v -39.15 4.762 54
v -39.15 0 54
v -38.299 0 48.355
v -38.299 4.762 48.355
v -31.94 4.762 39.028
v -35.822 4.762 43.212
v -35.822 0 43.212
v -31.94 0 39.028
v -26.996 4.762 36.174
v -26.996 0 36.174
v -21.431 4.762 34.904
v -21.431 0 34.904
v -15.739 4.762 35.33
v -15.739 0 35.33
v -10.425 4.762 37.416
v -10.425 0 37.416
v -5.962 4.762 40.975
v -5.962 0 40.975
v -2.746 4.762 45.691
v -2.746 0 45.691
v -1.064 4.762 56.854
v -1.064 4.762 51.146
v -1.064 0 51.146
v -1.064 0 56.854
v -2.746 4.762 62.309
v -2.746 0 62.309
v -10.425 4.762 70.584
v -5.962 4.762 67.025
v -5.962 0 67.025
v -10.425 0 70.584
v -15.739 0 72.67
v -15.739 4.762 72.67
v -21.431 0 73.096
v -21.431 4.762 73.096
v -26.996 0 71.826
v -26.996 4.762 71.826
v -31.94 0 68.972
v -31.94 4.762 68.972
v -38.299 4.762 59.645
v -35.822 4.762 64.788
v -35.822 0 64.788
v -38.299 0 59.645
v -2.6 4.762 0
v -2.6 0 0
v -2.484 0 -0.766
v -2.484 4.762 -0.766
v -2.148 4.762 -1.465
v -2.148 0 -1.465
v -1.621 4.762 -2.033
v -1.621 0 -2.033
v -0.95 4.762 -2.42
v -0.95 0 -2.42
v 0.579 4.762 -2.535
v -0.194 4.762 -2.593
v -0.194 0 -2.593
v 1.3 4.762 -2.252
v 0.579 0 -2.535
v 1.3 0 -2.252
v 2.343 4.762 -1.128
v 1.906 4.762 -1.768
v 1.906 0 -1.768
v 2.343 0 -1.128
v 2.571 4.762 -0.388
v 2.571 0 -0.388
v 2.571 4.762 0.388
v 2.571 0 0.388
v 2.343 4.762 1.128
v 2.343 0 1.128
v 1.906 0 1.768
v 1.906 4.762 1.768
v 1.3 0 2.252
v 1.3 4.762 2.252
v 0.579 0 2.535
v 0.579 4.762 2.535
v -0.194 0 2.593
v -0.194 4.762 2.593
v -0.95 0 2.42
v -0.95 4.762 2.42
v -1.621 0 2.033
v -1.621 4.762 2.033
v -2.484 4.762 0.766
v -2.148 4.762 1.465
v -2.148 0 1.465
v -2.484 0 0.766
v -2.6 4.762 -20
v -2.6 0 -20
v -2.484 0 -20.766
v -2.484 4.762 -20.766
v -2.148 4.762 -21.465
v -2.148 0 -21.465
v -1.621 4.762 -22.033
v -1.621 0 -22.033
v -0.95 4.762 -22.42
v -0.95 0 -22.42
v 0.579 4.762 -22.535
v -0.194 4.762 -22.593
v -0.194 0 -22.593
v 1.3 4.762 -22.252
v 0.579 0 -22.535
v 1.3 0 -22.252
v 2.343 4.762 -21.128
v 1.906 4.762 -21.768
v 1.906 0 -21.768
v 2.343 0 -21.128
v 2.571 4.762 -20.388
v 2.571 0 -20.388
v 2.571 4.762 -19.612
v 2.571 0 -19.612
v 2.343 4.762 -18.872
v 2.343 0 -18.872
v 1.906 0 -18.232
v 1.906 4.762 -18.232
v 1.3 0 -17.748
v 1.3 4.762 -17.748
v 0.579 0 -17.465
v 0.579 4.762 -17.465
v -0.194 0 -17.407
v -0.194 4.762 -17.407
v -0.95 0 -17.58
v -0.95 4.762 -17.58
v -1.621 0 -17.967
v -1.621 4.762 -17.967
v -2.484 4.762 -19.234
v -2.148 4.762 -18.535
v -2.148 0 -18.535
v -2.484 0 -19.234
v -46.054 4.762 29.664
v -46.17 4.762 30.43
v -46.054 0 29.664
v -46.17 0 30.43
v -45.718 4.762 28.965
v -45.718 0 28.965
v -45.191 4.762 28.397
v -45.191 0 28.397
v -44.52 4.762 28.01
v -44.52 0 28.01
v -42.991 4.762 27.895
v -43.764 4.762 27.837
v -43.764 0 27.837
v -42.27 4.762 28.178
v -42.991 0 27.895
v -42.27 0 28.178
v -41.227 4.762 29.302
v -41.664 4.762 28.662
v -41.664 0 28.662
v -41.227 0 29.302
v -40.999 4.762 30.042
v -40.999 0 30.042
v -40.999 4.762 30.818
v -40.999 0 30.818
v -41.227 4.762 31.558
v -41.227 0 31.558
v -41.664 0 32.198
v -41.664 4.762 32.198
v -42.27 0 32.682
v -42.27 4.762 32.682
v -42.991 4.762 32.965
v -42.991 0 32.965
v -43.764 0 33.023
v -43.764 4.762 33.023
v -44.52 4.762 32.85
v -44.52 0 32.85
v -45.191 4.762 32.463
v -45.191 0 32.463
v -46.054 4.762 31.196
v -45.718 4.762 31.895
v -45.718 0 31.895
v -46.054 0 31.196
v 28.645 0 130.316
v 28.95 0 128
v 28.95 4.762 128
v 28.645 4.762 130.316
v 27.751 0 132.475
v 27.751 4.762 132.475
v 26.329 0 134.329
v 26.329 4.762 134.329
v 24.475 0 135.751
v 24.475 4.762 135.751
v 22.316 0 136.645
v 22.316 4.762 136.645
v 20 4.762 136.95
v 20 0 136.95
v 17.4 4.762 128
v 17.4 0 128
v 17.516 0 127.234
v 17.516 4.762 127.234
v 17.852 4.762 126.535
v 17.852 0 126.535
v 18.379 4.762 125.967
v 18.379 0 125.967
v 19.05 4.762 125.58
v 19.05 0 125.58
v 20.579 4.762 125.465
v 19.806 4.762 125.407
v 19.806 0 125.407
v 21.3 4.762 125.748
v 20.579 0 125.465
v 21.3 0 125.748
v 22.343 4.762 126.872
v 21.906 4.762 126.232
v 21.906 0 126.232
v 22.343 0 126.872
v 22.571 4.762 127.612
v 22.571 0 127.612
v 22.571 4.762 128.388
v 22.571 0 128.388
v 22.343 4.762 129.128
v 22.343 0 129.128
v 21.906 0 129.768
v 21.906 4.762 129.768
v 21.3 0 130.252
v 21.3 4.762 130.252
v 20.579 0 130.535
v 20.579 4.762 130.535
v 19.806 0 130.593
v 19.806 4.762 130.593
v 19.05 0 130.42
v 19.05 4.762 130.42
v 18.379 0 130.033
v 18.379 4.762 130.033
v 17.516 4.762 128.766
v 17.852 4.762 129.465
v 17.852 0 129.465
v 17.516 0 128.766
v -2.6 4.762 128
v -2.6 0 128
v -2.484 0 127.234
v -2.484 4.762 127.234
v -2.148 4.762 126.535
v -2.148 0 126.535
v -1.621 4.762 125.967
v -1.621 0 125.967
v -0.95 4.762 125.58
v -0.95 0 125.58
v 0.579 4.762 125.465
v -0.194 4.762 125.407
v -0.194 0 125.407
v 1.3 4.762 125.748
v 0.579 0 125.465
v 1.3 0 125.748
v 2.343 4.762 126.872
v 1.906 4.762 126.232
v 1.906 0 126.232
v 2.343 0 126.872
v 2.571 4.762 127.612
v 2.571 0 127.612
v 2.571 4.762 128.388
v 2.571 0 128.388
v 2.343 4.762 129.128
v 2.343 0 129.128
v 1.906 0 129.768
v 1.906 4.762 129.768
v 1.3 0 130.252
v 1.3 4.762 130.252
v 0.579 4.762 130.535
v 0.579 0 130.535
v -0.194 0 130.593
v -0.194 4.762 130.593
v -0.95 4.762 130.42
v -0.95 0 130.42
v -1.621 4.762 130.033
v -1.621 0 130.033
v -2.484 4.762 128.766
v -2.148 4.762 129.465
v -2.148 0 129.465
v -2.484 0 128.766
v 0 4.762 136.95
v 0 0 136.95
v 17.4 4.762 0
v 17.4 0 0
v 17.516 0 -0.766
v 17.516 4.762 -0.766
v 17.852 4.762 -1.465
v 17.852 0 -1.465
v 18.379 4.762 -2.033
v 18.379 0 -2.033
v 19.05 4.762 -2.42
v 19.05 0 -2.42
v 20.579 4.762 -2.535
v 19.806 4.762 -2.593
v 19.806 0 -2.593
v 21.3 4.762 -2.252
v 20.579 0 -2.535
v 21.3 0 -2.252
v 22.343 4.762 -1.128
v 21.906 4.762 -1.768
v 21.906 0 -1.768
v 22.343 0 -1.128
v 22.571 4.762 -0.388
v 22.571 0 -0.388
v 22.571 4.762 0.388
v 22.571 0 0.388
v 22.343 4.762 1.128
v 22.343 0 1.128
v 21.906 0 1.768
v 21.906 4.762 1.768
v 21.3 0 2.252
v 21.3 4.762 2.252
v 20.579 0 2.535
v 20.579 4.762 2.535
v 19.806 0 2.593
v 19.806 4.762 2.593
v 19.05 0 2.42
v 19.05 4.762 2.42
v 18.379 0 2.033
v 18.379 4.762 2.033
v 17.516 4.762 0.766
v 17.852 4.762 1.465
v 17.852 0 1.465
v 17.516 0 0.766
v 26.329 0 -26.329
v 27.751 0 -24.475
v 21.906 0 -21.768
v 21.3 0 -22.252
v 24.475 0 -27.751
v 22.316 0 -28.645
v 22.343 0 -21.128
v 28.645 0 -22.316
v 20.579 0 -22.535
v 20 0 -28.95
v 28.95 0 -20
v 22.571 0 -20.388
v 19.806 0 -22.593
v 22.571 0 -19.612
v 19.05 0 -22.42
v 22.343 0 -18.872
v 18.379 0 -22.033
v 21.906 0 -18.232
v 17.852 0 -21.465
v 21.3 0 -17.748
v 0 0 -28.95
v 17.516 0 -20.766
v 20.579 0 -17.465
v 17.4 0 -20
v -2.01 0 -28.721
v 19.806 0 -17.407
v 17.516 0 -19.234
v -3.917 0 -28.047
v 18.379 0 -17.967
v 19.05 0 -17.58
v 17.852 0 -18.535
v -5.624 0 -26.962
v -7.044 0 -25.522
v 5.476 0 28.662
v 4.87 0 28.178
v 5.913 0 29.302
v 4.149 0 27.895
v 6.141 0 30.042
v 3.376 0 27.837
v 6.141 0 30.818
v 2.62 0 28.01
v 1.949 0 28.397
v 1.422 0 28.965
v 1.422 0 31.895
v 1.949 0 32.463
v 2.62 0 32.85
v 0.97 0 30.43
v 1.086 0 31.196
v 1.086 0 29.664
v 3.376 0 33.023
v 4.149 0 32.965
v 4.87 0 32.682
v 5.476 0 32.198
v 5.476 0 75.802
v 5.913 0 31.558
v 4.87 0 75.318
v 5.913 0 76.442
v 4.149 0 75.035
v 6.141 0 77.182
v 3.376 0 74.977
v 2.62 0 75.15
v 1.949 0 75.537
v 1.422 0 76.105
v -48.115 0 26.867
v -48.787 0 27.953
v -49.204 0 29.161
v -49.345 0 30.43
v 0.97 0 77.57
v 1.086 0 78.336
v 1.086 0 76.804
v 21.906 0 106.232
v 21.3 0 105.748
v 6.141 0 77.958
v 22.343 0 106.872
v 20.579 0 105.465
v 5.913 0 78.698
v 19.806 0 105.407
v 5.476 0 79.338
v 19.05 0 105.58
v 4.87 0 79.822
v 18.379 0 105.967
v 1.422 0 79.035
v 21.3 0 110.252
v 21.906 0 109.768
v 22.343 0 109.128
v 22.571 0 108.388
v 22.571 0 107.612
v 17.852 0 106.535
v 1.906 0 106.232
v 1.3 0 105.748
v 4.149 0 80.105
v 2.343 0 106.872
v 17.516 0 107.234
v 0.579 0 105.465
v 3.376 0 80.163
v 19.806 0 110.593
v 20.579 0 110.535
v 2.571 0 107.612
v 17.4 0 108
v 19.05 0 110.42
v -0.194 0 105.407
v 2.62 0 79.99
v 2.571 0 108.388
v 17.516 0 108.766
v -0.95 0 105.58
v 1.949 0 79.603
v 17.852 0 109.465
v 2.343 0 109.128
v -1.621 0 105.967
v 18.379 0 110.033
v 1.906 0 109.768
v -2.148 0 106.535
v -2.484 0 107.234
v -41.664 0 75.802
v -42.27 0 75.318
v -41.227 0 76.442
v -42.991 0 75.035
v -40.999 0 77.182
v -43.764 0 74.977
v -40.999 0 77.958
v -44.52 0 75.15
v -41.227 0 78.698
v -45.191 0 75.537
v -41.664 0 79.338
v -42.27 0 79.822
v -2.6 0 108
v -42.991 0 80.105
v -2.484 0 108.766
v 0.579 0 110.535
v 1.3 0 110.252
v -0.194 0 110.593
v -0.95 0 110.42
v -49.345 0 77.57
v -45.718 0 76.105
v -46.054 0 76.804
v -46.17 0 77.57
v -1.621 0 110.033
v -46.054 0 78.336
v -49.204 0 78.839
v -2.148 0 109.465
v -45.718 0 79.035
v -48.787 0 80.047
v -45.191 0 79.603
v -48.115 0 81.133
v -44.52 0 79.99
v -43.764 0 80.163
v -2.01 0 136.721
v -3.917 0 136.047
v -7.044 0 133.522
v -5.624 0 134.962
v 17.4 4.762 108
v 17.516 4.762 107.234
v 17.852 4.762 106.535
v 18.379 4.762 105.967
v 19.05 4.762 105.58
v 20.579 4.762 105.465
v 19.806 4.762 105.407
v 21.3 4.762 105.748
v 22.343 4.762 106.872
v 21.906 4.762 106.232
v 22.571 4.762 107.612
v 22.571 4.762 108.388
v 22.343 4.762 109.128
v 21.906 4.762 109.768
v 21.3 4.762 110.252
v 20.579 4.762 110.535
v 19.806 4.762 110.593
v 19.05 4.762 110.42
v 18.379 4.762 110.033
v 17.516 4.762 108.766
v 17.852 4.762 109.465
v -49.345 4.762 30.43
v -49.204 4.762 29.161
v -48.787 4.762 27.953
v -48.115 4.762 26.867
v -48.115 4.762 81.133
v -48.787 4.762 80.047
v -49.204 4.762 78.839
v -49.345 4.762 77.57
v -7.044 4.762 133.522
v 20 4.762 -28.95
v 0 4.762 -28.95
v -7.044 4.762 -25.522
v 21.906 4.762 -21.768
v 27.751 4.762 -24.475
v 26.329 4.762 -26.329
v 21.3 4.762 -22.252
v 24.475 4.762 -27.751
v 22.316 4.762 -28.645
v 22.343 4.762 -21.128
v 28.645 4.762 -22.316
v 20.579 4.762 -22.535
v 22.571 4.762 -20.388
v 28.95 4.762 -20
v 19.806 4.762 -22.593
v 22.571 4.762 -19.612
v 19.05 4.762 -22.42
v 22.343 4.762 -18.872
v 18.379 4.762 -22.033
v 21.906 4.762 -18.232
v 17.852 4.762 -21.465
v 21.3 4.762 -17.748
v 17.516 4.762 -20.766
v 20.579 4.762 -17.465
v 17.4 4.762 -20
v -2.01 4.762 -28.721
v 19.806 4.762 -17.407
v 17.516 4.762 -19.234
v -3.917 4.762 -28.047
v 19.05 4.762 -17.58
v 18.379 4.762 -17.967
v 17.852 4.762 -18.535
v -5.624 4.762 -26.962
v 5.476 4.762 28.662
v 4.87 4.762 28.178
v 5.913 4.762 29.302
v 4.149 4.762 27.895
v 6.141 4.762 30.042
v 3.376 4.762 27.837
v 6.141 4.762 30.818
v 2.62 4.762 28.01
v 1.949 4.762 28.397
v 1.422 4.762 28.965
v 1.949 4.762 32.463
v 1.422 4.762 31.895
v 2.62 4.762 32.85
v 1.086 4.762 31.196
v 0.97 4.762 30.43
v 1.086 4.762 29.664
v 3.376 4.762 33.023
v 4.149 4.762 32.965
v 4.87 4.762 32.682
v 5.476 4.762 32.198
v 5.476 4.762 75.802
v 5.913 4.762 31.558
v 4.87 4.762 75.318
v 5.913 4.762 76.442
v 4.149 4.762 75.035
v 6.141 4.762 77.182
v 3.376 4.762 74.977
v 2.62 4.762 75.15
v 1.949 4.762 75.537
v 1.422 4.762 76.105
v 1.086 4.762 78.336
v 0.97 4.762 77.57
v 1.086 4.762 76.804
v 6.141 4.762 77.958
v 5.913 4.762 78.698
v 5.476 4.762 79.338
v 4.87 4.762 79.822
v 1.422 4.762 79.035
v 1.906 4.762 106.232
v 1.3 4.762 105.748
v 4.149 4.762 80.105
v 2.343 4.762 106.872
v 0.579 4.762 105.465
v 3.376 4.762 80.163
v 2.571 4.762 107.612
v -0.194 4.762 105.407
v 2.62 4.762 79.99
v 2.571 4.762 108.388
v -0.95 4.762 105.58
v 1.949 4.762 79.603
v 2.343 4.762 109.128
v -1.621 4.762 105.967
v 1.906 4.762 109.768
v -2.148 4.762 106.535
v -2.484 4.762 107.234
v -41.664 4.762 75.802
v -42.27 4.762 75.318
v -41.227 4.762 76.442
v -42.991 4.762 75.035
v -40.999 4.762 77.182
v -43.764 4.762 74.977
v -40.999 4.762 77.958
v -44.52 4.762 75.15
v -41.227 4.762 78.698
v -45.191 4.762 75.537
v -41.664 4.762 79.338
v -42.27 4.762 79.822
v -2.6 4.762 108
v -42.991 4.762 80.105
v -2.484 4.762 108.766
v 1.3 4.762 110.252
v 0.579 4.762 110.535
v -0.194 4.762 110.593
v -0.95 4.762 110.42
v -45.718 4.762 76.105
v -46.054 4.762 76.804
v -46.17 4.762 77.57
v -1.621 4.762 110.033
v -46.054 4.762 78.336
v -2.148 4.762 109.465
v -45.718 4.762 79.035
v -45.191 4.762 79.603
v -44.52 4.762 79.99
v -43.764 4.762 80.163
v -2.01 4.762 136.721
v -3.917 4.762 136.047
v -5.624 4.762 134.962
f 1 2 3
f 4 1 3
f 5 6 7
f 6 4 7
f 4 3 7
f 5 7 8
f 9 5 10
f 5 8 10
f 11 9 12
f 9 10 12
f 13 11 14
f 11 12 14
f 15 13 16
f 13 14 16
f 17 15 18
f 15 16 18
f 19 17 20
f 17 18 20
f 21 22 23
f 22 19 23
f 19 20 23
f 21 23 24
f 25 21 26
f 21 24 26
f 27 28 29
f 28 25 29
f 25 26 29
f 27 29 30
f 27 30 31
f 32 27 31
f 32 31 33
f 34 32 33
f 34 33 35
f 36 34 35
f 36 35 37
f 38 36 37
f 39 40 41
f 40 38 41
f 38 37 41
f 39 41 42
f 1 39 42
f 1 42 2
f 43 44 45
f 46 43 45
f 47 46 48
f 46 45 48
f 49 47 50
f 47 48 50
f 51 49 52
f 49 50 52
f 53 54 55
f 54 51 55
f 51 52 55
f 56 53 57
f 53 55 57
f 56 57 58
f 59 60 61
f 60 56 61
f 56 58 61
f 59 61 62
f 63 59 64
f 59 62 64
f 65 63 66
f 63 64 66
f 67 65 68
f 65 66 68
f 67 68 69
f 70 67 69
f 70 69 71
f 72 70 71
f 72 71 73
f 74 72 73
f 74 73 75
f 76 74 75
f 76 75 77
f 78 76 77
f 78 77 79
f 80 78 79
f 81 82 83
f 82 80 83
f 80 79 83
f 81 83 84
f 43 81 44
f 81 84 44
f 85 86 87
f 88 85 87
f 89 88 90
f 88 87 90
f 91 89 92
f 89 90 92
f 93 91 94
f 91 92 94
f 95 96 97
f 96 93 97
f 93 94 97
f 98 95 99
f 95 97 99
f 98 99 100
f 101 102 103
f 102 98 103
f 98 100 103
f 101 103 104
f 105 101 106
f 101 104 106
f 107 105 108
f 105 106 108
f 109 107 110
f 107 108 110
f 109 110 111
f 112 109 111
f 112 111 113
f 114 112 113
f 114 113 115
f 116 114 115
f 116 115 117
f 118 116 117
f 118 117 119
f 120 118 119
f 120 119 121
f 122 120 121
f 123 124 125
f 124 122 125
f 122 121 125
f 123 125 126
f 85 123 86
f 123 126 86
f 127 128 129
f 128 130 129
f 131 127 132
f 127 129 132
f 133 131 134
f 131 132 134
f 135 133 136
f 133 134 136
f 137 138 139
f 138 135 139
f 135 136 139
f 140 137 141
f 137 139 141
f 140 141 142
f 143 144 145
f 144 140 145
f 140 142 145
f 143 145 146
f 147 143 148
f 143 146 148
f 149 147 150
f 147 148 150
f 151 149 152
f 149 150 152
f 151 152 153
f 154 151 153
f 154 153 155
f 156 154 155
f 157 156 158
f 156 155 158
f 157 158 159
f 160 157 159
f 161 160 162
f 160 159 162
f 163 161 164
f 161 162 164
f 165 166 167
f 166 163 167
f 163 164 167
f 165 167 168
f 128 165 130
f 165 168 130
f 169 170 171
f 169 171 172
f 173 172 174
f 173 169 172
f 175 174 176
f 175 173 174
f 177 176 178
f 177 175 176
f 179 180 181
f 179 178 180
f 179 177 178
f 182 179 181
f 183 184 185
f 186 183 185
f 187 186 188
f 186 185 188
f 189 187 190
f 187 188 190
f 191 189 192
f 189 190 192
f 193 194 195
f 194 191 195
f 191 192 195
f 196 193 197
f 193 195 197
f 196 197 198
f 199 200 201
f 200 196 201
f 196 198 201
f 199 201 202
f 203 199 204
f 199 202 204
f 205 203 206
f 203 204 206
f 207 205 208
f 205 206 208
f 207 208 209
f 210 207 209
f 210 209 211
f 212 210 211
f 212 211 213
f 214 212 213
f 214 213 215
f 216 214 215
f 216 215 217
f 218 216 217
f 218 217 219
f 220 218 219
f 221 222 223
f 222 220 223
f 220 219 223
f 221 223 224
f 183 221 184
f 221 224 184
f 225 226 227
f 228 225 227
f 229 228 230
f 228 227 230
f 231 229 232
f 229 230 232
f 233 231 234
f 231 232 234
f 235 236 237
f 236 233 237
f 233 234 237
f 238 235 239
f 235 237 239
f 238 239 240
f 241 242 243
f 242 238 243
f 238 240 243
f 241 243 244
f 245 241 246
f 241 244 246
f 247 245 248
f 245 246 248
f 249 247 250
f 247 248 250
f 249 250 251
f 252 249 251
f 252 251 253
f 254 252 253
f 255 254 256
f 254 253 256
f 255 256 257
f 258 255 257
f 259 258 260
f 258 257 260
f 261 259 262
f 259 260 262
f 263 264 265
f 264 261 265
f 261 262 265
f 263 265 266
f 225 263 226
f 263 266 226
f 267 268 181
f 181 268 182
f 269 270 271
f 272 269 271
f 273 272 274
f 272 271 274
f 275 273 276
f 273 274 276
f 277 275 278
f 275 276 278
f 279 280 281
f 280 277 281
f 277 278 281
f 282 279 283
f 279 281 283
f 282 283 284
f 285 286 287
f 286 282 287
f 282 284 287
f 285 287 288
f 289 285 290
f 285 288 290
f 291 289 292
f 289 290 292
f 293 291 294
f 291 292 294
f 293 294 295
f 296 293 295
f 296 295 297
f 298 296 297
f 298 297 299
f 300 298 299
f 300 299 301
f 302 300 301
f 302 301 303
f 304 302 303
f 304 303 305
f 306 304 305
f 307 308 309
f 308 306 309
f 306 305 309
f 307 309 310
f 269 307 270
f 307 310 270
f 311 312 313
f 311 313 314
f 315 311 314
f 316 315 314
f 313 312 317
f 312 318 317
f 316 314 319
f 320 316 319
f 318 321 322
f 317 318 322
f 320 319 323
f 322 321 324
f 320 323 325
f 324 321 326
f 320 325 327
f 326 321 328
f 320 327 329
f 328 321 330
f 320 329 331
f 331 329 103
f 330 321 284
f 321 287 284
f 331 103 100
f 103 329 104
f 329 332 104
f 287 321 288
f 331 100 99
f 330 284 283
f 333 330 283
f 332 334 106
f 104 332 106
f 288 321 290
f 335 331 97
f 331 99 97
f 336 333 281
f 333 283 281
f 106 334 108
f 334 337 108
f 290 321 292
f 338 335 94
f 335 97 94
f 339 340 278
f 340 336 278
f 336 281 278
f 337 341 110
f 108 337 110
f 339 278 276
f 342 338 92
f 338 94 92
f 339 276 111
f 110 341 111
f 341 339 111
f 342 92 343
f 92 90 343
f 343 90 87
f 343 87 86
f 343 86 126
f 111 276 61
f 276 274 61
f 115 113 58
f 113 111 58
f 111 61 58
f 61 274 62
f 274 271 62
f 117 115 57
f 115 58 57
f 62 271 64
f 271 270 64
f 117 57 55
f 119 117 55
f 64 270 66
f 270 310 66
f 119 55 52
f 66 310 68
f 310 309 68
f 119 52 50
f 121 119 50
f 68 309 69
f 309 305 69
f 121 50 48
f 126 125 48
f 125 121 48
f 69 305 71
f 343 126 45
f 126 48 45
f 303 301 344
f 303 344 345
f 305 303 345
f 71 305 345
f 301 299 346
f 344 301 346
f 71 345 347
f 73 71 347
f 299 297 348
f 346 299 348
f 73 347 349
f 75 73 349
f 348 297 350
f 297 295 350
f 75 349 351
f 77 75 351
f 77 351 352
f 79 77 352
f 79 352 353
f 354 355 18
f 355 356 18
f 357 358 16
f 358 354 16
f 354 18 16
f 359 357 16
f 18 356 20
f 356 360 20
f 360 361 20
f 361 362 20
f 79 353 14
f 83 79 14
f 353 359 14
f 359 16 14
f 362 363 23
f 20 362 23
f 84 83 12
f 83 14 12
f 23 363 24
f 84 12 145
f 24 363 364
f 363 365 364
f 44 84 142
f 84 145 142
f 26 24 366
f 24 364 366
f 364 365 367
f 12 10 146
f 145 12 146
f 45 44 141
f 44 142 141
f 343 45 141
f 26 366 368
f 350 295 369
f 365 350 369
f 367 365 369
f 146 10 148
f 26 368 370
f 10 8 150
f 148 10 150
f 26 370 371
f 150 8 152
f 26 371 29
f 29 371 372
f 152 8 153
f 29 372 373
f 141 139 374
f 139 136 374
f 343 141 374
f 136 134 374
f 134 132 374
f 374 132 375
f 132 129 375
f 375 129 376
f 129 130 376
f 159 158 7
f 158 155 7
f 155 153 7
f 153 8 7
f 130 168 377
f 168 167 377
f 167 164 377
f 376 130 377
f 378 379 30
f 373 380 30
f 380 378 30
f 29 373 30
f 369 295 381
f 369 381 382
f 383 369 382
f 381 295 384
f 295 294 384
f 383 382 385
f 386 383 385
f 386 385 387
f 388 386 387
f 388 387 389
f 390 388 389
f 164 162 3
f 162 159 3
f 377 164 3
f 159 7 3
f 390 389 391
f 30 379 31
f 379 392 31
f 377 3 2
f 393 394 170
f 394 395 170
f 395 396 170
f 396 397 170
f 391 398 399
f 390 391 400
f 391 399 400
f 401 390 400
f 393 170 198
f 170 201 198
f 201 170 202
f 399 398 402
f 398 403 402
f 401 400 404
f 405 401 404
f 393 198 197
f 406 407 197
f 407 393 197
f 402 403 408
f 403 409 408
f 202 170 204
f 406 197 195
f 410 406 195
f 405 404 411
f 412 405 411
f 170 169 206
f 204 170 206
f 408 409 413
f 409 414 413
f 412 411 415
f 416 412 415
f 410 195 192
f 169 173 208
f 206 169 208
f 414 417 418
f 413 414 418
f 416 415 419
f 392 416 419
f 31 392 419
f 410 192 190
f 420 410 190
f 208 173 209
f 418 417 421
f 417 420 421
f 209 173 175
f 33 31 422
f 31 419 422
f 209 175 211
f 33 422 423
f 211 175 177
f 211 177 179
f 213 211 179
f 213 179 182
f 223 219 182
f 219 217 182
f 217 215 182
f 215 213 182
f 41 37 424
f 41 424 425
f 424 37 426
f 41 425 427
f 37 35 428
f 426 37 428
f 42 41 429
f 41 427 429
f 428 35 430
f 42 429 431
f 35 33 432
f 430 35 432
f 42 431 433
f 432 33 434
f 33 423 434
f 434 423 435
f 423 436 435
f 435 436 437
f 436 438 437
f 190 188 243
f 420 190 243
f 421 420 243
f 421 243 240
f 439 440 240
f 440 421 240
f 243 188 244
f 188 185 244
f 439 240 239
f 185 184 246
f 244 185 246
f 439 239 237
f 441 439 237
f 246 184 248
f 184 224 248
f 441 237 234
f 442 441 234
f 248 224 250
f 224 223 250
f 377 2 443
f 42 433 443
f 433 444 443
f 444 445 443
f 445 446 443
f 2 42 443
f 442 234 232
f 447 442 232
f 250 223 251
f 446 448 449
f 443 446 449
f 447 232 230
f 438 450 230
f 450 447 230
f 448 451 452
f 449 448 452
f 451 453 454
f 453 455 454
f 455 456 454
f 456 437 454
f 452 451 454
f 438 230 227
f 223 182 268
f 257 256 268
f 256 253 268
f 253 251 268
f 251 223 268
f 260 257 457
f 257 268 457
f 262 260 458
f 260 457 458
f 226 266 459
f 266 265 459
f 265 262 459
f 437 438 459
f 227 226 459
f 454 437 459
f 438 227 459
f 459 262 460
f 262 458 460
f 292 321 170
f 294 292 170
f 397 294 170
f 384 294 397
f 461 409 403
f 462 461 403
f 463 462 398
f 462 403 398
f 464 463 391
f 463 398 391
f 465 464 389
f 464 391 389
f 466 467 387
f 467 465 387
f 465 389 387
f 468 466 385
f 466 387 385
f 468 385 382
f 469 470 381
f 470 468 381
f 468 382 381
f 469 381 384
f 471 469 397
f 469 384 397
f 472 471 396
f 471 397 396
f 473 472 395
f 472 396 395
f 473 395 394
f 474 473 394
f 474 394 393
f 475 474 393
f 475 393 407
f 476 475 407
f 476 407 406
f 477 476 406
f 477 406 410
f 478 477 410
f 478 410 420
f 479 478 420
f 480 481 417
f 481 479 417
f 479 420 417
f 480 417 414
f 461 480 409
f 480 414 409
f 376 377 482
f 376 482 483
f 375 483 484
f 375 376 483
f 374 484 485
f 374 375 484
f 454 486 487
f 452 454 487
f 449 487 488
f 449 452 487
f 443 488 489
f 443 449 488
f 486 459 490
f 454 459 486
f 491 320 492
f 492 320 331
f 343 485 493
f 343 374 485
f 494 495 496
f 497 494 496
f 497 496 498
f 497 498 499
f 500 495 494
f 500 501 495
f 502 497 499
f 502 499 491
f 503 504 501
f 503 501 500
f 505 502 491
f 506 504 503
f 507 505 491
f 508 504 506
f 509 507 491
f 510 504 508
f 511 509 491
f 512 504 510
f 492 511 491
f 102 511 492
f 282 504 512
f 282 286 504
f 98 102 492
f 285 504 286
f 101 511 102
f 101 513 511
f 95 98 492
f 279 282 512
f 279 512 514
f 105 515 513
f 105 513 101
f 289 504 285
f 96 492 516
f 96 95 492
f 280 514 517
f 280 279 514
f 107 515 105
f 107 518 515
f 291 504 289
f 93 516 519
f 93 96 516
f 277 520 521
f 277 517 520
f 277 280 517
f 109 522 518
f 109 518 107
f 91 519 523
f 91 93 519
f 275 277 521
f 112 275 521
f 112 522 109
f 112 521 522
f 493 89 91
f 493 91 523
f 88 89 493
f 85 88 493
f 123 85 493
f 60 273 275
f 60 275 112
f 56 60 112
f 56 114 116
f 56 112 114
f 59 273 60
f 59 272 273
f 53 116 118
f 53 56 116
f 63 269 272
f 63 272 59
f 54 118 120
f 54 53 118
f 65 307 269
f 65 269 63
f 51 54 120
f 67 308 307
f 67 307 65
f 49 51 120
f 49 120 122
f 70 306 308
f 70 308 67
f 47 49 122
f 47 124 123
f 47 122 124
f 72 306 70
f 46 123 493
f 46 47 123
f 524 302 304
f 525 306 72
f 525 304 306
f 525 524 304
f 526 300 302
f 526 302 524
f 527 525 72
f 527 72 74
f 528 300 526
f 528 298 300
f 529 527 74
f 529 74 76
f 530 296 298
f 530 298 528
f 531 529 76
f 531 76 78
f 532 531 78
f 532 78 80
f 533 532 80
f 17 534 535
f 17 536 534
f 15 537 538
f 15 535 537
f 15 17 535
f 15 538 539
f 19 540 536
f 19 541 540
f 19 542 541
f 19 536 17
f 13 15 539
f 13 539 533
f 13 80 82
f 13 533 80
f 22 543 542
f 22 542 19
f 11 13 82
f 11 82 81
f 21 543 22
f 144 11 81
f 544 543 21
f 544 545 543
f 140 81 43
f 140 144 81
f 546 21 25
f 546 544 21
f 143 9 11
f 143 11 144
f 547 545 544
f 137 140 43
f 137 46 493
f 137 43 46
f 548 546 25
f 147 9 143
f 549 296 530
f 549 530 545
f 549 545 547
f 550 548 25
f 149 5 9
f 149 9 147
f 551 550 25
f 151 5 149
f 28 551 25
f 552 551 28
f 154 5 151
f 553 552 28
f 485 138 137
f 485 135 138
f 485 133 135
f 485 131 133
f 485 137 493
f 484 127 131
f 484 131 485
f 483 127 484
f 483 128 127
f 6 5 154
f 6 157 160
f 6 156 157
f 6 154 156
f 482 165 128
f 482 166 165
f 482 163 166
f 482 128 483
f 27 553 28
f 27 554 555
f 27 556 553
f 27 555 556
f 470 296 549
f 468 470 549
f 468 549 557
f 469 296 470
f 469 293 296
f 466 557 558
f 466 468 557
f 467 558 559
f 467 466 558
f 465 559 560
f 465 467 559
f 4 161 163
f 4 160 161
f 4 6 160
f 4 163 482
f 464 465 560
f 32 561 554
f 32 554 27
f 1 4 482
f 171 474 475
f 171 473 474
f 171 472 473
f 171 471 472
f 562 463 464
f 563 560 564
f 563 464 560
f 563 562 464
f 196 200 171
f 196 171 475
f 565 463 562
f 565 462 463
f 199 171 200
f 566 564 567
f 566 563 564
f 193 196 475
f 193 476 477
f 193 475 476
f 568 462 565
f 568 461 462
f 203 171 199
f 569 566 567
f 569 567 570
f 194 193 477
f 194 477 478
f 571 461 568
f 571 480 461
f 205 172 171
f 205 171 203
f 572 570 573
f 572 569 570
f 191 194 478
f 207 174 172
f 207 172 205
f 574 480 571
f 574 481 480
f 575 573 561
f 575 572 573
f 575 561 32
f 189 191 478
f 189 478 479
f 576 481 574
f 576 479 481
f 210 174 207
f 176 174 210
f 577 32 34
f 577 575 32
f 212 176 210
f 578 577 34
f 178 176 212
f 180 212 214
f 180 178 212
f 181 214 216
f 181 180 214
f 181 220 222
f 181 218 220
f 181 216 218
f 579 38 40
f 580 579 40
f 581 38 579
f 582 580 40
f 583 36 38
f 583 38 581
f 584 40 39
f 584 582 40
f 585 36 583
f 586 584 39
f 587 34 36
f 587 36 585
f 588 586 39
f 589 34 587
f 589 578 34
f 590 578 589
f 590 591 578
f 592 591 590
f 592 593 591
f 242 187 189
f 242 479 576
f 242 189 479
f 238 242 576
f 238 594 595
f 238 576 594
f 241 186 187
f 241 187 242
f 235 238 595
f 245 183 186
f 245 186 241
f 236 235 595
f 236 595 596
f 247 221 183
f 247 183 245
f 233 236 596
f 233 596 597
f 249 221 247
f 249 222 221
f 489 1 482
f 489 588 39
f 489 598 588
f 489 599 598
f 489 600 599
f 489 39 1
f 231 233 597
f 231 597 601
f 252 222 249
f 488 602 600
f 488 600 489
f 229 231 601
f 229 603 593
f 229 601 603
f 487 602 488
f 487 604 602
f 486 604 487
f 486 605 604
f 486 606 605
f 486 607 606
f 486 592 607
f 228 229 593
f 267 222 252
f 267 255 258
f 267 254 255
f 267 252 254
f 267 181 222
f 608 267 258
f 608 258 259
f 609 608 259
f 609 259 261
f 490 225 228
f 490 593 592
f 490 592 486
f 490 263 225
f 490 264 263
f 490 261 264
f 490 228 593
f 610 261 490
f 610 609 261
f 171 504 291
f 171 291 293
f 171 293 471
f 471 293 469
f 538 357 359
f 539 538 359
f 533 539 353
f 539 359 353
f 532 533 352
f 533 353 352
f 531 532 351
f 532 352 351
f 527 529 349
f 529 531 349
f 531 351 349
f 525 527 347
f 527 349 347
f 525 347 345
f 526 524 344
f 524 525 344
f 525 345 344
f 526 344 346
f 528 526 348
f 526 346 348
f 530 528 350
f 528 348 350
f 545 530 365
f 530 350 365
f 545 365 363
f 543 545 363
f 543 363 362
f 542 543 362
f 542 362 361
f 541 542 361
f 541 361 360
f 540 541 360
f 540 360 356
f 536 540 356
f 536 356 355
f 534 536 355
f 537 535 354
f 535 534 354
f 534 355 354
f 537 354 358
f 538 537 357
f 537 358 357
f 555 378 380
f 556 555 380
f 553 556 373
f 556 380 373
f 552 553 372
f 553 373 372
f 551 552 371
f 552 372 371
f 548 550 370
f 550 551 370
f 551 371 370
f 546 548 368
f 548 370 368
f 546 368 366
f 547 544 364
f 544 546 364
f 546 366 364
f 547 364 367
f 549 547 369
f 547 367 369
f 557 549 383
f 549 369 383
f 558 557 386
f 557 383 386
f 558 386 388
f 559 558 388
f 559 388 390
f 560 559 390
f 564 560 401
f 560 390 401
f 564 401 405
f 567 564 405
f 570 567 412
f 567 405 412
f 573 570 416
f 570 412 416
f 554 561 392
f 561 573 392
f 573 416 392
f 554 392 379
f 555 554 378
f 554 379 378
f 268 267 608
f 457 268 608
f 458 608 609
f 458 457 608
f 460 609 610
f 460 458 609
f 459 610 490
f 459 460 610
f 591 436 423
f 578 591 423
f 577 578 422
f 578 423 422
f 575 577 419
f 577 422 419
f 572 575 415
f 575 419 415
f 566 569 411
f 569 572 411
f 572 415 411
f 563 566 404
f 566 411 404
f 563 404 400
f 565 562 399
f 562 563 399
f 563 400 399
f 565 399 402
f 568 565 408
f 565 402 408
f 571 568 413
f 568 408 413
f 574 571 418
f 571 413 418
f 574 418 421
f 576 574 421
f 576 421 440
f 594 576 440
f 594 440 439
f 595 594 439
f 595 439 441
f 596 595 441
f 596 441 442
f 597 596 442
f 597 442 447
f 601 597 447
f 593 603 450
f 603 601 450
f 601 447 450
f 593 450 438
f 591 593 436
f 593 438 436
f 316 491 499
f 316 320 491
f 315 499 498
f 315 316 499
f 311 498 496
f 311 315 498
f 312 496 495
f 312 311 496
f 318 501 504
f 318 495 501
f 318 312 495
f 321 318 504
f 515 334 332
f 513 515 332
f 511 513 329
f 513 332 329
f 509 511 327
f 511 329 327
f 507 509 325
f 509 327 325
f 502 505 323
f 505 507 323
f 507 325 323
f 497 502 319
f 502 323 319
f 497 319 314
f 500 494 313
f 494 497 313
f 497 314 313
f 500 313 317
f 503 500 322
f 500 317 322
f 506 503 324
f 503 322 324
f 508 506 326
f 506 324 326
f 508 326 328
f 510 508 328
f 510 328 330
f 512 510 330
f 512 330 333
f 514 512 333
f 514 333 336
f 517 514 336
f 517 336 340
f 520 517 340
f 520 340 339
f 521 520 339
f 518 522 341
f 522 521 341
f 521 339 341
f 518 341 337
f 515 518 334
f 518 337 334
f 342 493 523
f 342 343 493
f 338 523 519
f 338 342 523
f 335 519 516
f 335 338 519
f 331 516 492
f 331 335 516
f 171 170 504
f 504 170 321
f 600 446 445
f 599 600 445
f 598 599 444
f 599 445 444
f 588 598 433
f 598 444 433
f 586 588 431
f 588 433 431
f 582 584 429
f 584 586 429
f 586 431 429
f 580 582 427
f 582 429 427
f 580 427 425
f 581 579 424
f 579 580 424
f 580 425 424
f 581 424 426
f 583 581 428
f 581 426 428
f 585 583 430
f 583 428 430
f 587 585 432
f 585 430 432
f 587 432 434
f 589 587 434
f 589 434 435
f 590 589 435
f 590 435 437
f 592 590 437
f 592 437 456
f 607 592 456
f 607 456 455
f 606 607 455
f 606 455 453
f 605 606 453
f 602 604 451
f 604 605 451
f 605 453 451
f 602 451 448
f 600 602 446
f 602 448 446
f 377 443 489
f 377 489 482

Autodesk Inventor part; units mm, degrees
ref_plane "YZ Plane" through (0, 0, 0) normal (1, 0, 0) x (0, 1, 0)
ref_plane "XZ Plane" through (0, 0, 0) normal (0, 1, 0) x (-1, 0, 0)
ref_plane "XY Plane" through (0, 0, 0) normal (0, 0, 1) x (1, 0, 0)
sketch "Sketch1" plane through (0, 0, 0) normal (0, 1, 0) x (-1, 0, 0)
  circle A0 centre (0, 0) radius 2.6
  line L0 (0, 0) -> (0, -2.6) construction
  line L1 (0, 0) -> (-2.6, 0) construction
  circle A1 centre (0, -20) radius 2.6
  circle A2 centre (-20, 0) radius 2.6
  circle A3 centre (-20, -20) radius 2.6
  circle A4 centre (0, 108) radius 2.6
  circle A5 centre (-20, 108) radius 2.6
  circle A6 centre (0, 128) radius 2.6
  circle A7 centre (-20, 128) radius 2.6
  circle A8 centre (20, 54) radius 19.15
  circle A9 centre (43.57, 30.43) radius 2.6
  circle A10 centre (-3.57, 30.43) radius 2.6
  circle A11 centre (-3.57, 77.57) radius 2.6
  circle A12 centre (43.57, 77.57) radius 2.6
  circle A13 centre (43.57, 77.57) radius 5.775 construction
  circle A14 centre (43.57, 30.43) radius 5.775 construction
  circle A15 centre (0, 128) radius 8.95 construction
  circle A16 centre (-20, 128) radius 8.95 construction
  circle A17 centre (0, -20) radius 8.95 construction
  circle A18 centre (-20, -20) radius 8.95 construction
  line L2 (7.0435, 133.5219) -> (48.1148, 81.133)
  line L3 (48.1148, 26.867) -> (7.0435, -25.5219)
  line L4 (0, 136.95) -> (-20, 136.95)
  line L5 (-28.95, 128) -> (-28.95, -20)
  line L6 (-20, -28.95) -> (0, -28.95)
  line L7 (49.345, 77.57) -> (49.345, 30.43)
  arc A19 (49.345, 77.57) -> (48.1148, 81.133) centre (43.57, 77.57) ccw
  arc A20 (48.1148, 26.867) -> (49.345, 30.43) centre (43.57, 30.43) ccw
  arc A21 (0, -28.95) -> (7.0435, -25.5219) centre (0, -20) ccw
  arc A22 (-28.95, -20) -> (-20, -28.95) centre (-20, -20) ccw
  arc A23 (-20, 136.95) -> (-28.95, 128) centre (-20, 128) ccw
  arc A24 (7.0435, 133.5219) -> (0, 136.95) centre (0, 128) ccw
  point P0 (0, -22.6)
  point P1 (-2.6, -20)
  point P2 (-20, -2.6)
  point P3 (-22.6, 0)
  point P4 (-20, -22.6)
  point P5 (-22.6, -20)
  dimension "d0" = 5.2
  dimension "d3" = 20
  dimension "d6" = 20
  dimension "d9" = 108
  dimension "d10" = 20
  dimension "d11" = 20
  dimension "d13" = 54
  dimension "d14" = 38.3
  dimension "d15" = 23.57
  dimension "d16" = 23.57
  dimension "d17" = 47.14
  dimension "d18" = 47.14
  dimension "d19" = 3.175
  dimension "d20" = 6.35
extrude "Extrusion1" add sketch "Sketch1" along normal blind 4.7625
equation "\"d13\" = 0.5 * d9"
equation "\"d18\" = d17"
properties part number "CNC-000-StructureGusset1" material "Steel AISI 1008 91 HR"
